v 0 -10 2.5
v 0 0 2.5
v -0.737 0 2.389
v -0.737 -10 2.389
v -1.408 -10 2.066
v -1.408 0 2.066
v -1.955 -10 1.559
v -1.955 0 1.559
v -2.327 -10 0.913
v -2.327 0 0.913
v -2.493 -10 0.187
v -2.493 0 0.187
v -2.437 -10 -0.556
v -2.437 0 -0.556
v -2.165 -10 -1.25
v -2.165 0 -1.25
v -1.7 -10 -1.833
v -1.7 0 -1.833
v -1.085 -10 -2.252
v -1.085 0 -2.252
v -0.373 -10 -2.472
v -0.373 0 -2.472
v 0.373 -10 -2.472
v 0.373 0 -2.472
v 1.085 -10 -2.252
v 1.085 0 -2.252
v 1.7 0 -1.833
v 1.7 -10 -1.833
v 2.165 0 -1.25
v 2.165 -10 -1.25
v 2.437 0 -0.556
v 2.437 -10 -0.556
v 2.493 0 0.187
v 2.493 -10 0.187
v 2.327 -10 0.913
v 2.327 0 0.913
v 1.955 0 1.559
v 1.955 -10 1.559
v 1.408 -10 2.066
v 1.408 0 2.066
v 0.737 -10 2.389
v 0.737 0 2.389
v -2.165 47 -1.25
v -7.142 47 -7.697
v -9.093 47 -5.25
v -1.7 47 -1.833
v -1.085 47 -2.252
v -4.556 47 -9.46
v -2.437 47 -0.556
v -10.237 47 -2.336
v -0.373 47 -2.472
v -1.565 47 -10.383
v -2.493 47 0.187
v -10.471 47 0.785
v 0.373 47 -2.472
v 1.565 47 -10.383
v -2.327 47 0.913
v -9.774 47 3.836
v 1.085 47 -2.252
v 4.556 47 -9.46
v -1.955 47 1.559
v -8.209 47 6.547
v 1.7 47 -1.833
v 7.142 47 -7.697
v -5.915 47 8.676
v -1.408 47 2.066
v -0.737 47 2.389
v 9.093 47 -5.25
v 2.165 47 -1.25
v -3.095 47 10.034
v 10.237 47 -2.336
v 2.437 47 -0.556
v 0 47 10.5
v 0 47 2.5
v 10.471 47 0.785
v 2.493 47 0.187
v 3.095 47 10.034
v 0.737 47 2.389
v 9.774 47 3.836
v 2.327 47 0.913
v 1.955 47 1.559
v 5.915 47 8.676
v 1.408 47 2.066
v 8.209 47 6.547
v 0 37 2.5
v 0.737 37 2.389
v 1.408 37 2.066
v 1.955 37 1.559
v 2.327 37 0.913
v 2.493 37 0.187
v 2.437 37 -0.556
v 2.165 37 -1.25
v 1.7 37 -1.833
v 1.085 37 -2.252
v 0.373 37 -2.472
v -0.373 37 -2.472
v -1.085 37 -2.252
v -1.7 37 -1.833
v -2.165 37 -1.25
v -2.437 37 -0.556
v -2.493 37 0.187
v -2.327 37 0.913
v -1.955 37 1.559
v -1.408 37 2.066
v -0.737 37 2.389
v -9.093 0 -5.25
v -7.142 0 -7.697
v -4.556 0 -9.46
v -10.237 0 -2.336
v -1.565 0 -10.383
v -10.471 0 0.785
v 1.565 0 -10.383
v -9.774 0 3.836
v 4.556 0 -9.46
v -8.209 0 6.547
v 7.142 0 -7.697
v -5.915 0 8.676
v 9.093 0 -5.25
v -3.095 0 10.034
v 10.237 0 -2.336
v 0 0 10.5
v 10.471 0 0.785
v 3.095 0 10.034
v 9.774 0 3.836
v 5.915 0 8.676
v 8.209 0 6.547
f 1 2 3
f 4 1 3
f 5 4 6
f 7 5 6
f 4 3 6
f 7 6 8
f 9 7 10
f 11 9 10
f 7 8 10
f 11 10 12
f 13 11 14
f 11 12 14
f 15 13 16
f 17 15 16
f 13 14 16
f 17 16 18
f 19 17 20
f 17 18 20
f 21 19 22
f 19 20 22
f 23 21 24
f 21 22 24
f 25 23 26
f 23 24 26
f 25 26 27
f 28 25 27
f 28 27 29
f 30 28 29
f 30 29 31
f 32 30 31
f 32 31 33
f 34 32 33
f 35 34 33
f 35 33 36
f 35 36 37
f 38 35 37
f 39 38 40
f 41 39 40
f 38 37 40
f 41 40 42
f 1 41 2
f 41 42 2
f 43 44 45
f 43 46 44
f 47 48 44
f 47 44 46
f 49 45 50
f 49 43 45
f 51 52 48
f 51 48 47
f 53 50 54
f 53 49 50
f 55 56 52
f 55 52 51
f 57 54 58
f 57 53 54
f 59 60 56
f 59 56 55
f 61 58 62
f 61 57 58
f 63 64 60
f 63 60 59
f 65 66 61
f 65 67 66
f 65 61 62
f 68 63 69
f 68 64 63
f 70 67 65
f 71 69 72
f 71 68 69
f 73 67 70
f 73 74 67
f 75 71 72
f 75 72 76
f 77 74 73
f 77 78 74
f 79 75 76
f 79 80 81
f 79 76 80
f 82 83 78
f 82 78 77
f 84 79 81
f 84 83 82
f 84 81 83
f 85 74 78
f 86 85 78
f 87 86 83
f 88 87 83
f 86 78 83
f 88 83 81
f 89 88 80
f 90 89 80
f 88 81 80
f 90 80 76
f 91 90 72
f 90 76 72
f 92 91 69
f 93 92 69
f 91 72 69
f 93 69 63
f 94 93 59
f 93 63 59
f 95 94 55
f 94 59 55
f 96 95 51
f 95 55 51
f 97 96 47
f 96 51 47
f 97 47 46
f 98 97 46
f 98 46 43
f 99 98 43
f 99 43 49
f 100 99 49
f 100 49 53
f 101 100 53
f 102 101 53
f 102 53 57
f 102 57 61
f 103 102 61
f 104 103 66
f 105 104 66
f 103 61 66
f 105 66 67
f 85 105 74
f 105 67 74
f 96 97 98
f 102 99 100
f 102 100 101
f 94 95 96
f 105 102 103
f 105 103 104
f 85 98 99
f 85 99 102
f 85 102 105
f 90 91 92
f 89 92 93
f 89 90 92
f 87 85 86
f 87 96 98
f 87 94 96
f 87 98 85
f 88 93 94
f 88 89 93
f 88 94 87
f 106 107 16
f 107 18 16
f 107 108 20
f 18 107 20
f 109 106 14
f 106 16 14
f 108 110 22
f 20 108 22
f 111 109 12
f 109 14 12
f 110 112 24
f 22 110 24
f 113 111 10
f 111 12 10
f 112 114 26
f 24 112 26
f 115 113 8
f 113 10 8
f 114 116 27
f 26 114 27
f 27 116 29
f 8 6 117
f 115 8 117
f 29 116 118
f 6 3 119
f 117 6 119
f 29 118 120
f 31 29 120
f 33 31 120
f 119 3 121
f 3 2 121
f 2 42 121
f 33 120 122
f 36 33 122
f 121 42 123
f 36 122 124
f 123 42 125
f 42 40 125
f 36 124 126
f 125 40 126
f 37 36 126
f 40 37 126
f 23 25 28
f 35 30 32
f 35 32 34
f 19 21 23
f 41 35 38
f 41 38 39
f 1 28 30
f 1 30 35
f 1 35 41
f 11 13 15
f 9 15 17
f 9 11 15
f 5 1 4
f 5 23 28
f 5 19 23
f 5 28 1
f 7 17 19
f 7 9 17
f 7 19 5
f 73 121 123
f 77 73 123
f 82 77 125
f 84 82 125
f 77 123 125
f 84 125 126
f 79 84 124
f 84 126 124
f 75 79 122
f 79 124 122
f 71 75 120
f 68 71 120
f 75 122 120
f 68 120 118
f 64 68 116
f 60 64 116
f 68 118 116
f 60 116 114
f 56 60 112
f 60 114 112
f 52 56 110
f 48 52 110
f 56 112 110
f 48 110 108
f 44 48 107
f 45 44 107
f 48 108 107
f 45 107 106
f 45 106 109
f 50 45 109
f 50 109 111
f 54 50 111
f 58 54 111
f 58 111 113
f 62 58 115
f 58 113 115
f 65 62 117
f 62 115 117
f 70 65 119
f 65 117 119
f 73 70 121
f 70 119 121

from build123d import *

# Parameters (mm, degrees)
SKETCH1_R           = 10.5
BOSS_EXTRUDE1_DEPTH = 47
SKETCH2_R           = 2.5
CUT_EXTRUDE1_DEPTH  = 10
SKETCH3_R           = 2.5
BOSS_EXTRUDE2_DEPTH = 10


with BuildPart() as part:
    # Sketch1 → Boss-Extrude1 (new body)
    with BuildSketch(Plane(origin=(0, 0, 0), x_dir=(1, 0, 0), z_dir=(0, 1, 0))):
        with Locations(Location((0, 0, 0), (0, 0, 270))):
            Circle(SKETCH1_R)
    extrude(amount=BOSS_EXTRUDE1_DEPTH)

    # Sketch2 → Cut-Extrude1 (cut)
    with BuildSketch(Plane(origin=(0, 47, 0), x_dir=(1, 0, 0), z_dir=(0, 1, 0))):
        with Locations(Location((0, 0, 0), (0, 0, 270))):
            Circle(SKETCH2_R)
    extrude(amount=-CUT_EXTRUDE1_DEPTH, mode=Mode.SUBTRACT)

    # Sketch3 → Boss-Extrude2 (add)
    with BuildSketch(Plane.XZ):
        with Locations(Location((0, 0, 0), (0, 0, 90))):
            Circle(SKETCH3_R)
    extrude(amount=BOSS_EXTRUDE2_DEPTH)


solid = part.part
